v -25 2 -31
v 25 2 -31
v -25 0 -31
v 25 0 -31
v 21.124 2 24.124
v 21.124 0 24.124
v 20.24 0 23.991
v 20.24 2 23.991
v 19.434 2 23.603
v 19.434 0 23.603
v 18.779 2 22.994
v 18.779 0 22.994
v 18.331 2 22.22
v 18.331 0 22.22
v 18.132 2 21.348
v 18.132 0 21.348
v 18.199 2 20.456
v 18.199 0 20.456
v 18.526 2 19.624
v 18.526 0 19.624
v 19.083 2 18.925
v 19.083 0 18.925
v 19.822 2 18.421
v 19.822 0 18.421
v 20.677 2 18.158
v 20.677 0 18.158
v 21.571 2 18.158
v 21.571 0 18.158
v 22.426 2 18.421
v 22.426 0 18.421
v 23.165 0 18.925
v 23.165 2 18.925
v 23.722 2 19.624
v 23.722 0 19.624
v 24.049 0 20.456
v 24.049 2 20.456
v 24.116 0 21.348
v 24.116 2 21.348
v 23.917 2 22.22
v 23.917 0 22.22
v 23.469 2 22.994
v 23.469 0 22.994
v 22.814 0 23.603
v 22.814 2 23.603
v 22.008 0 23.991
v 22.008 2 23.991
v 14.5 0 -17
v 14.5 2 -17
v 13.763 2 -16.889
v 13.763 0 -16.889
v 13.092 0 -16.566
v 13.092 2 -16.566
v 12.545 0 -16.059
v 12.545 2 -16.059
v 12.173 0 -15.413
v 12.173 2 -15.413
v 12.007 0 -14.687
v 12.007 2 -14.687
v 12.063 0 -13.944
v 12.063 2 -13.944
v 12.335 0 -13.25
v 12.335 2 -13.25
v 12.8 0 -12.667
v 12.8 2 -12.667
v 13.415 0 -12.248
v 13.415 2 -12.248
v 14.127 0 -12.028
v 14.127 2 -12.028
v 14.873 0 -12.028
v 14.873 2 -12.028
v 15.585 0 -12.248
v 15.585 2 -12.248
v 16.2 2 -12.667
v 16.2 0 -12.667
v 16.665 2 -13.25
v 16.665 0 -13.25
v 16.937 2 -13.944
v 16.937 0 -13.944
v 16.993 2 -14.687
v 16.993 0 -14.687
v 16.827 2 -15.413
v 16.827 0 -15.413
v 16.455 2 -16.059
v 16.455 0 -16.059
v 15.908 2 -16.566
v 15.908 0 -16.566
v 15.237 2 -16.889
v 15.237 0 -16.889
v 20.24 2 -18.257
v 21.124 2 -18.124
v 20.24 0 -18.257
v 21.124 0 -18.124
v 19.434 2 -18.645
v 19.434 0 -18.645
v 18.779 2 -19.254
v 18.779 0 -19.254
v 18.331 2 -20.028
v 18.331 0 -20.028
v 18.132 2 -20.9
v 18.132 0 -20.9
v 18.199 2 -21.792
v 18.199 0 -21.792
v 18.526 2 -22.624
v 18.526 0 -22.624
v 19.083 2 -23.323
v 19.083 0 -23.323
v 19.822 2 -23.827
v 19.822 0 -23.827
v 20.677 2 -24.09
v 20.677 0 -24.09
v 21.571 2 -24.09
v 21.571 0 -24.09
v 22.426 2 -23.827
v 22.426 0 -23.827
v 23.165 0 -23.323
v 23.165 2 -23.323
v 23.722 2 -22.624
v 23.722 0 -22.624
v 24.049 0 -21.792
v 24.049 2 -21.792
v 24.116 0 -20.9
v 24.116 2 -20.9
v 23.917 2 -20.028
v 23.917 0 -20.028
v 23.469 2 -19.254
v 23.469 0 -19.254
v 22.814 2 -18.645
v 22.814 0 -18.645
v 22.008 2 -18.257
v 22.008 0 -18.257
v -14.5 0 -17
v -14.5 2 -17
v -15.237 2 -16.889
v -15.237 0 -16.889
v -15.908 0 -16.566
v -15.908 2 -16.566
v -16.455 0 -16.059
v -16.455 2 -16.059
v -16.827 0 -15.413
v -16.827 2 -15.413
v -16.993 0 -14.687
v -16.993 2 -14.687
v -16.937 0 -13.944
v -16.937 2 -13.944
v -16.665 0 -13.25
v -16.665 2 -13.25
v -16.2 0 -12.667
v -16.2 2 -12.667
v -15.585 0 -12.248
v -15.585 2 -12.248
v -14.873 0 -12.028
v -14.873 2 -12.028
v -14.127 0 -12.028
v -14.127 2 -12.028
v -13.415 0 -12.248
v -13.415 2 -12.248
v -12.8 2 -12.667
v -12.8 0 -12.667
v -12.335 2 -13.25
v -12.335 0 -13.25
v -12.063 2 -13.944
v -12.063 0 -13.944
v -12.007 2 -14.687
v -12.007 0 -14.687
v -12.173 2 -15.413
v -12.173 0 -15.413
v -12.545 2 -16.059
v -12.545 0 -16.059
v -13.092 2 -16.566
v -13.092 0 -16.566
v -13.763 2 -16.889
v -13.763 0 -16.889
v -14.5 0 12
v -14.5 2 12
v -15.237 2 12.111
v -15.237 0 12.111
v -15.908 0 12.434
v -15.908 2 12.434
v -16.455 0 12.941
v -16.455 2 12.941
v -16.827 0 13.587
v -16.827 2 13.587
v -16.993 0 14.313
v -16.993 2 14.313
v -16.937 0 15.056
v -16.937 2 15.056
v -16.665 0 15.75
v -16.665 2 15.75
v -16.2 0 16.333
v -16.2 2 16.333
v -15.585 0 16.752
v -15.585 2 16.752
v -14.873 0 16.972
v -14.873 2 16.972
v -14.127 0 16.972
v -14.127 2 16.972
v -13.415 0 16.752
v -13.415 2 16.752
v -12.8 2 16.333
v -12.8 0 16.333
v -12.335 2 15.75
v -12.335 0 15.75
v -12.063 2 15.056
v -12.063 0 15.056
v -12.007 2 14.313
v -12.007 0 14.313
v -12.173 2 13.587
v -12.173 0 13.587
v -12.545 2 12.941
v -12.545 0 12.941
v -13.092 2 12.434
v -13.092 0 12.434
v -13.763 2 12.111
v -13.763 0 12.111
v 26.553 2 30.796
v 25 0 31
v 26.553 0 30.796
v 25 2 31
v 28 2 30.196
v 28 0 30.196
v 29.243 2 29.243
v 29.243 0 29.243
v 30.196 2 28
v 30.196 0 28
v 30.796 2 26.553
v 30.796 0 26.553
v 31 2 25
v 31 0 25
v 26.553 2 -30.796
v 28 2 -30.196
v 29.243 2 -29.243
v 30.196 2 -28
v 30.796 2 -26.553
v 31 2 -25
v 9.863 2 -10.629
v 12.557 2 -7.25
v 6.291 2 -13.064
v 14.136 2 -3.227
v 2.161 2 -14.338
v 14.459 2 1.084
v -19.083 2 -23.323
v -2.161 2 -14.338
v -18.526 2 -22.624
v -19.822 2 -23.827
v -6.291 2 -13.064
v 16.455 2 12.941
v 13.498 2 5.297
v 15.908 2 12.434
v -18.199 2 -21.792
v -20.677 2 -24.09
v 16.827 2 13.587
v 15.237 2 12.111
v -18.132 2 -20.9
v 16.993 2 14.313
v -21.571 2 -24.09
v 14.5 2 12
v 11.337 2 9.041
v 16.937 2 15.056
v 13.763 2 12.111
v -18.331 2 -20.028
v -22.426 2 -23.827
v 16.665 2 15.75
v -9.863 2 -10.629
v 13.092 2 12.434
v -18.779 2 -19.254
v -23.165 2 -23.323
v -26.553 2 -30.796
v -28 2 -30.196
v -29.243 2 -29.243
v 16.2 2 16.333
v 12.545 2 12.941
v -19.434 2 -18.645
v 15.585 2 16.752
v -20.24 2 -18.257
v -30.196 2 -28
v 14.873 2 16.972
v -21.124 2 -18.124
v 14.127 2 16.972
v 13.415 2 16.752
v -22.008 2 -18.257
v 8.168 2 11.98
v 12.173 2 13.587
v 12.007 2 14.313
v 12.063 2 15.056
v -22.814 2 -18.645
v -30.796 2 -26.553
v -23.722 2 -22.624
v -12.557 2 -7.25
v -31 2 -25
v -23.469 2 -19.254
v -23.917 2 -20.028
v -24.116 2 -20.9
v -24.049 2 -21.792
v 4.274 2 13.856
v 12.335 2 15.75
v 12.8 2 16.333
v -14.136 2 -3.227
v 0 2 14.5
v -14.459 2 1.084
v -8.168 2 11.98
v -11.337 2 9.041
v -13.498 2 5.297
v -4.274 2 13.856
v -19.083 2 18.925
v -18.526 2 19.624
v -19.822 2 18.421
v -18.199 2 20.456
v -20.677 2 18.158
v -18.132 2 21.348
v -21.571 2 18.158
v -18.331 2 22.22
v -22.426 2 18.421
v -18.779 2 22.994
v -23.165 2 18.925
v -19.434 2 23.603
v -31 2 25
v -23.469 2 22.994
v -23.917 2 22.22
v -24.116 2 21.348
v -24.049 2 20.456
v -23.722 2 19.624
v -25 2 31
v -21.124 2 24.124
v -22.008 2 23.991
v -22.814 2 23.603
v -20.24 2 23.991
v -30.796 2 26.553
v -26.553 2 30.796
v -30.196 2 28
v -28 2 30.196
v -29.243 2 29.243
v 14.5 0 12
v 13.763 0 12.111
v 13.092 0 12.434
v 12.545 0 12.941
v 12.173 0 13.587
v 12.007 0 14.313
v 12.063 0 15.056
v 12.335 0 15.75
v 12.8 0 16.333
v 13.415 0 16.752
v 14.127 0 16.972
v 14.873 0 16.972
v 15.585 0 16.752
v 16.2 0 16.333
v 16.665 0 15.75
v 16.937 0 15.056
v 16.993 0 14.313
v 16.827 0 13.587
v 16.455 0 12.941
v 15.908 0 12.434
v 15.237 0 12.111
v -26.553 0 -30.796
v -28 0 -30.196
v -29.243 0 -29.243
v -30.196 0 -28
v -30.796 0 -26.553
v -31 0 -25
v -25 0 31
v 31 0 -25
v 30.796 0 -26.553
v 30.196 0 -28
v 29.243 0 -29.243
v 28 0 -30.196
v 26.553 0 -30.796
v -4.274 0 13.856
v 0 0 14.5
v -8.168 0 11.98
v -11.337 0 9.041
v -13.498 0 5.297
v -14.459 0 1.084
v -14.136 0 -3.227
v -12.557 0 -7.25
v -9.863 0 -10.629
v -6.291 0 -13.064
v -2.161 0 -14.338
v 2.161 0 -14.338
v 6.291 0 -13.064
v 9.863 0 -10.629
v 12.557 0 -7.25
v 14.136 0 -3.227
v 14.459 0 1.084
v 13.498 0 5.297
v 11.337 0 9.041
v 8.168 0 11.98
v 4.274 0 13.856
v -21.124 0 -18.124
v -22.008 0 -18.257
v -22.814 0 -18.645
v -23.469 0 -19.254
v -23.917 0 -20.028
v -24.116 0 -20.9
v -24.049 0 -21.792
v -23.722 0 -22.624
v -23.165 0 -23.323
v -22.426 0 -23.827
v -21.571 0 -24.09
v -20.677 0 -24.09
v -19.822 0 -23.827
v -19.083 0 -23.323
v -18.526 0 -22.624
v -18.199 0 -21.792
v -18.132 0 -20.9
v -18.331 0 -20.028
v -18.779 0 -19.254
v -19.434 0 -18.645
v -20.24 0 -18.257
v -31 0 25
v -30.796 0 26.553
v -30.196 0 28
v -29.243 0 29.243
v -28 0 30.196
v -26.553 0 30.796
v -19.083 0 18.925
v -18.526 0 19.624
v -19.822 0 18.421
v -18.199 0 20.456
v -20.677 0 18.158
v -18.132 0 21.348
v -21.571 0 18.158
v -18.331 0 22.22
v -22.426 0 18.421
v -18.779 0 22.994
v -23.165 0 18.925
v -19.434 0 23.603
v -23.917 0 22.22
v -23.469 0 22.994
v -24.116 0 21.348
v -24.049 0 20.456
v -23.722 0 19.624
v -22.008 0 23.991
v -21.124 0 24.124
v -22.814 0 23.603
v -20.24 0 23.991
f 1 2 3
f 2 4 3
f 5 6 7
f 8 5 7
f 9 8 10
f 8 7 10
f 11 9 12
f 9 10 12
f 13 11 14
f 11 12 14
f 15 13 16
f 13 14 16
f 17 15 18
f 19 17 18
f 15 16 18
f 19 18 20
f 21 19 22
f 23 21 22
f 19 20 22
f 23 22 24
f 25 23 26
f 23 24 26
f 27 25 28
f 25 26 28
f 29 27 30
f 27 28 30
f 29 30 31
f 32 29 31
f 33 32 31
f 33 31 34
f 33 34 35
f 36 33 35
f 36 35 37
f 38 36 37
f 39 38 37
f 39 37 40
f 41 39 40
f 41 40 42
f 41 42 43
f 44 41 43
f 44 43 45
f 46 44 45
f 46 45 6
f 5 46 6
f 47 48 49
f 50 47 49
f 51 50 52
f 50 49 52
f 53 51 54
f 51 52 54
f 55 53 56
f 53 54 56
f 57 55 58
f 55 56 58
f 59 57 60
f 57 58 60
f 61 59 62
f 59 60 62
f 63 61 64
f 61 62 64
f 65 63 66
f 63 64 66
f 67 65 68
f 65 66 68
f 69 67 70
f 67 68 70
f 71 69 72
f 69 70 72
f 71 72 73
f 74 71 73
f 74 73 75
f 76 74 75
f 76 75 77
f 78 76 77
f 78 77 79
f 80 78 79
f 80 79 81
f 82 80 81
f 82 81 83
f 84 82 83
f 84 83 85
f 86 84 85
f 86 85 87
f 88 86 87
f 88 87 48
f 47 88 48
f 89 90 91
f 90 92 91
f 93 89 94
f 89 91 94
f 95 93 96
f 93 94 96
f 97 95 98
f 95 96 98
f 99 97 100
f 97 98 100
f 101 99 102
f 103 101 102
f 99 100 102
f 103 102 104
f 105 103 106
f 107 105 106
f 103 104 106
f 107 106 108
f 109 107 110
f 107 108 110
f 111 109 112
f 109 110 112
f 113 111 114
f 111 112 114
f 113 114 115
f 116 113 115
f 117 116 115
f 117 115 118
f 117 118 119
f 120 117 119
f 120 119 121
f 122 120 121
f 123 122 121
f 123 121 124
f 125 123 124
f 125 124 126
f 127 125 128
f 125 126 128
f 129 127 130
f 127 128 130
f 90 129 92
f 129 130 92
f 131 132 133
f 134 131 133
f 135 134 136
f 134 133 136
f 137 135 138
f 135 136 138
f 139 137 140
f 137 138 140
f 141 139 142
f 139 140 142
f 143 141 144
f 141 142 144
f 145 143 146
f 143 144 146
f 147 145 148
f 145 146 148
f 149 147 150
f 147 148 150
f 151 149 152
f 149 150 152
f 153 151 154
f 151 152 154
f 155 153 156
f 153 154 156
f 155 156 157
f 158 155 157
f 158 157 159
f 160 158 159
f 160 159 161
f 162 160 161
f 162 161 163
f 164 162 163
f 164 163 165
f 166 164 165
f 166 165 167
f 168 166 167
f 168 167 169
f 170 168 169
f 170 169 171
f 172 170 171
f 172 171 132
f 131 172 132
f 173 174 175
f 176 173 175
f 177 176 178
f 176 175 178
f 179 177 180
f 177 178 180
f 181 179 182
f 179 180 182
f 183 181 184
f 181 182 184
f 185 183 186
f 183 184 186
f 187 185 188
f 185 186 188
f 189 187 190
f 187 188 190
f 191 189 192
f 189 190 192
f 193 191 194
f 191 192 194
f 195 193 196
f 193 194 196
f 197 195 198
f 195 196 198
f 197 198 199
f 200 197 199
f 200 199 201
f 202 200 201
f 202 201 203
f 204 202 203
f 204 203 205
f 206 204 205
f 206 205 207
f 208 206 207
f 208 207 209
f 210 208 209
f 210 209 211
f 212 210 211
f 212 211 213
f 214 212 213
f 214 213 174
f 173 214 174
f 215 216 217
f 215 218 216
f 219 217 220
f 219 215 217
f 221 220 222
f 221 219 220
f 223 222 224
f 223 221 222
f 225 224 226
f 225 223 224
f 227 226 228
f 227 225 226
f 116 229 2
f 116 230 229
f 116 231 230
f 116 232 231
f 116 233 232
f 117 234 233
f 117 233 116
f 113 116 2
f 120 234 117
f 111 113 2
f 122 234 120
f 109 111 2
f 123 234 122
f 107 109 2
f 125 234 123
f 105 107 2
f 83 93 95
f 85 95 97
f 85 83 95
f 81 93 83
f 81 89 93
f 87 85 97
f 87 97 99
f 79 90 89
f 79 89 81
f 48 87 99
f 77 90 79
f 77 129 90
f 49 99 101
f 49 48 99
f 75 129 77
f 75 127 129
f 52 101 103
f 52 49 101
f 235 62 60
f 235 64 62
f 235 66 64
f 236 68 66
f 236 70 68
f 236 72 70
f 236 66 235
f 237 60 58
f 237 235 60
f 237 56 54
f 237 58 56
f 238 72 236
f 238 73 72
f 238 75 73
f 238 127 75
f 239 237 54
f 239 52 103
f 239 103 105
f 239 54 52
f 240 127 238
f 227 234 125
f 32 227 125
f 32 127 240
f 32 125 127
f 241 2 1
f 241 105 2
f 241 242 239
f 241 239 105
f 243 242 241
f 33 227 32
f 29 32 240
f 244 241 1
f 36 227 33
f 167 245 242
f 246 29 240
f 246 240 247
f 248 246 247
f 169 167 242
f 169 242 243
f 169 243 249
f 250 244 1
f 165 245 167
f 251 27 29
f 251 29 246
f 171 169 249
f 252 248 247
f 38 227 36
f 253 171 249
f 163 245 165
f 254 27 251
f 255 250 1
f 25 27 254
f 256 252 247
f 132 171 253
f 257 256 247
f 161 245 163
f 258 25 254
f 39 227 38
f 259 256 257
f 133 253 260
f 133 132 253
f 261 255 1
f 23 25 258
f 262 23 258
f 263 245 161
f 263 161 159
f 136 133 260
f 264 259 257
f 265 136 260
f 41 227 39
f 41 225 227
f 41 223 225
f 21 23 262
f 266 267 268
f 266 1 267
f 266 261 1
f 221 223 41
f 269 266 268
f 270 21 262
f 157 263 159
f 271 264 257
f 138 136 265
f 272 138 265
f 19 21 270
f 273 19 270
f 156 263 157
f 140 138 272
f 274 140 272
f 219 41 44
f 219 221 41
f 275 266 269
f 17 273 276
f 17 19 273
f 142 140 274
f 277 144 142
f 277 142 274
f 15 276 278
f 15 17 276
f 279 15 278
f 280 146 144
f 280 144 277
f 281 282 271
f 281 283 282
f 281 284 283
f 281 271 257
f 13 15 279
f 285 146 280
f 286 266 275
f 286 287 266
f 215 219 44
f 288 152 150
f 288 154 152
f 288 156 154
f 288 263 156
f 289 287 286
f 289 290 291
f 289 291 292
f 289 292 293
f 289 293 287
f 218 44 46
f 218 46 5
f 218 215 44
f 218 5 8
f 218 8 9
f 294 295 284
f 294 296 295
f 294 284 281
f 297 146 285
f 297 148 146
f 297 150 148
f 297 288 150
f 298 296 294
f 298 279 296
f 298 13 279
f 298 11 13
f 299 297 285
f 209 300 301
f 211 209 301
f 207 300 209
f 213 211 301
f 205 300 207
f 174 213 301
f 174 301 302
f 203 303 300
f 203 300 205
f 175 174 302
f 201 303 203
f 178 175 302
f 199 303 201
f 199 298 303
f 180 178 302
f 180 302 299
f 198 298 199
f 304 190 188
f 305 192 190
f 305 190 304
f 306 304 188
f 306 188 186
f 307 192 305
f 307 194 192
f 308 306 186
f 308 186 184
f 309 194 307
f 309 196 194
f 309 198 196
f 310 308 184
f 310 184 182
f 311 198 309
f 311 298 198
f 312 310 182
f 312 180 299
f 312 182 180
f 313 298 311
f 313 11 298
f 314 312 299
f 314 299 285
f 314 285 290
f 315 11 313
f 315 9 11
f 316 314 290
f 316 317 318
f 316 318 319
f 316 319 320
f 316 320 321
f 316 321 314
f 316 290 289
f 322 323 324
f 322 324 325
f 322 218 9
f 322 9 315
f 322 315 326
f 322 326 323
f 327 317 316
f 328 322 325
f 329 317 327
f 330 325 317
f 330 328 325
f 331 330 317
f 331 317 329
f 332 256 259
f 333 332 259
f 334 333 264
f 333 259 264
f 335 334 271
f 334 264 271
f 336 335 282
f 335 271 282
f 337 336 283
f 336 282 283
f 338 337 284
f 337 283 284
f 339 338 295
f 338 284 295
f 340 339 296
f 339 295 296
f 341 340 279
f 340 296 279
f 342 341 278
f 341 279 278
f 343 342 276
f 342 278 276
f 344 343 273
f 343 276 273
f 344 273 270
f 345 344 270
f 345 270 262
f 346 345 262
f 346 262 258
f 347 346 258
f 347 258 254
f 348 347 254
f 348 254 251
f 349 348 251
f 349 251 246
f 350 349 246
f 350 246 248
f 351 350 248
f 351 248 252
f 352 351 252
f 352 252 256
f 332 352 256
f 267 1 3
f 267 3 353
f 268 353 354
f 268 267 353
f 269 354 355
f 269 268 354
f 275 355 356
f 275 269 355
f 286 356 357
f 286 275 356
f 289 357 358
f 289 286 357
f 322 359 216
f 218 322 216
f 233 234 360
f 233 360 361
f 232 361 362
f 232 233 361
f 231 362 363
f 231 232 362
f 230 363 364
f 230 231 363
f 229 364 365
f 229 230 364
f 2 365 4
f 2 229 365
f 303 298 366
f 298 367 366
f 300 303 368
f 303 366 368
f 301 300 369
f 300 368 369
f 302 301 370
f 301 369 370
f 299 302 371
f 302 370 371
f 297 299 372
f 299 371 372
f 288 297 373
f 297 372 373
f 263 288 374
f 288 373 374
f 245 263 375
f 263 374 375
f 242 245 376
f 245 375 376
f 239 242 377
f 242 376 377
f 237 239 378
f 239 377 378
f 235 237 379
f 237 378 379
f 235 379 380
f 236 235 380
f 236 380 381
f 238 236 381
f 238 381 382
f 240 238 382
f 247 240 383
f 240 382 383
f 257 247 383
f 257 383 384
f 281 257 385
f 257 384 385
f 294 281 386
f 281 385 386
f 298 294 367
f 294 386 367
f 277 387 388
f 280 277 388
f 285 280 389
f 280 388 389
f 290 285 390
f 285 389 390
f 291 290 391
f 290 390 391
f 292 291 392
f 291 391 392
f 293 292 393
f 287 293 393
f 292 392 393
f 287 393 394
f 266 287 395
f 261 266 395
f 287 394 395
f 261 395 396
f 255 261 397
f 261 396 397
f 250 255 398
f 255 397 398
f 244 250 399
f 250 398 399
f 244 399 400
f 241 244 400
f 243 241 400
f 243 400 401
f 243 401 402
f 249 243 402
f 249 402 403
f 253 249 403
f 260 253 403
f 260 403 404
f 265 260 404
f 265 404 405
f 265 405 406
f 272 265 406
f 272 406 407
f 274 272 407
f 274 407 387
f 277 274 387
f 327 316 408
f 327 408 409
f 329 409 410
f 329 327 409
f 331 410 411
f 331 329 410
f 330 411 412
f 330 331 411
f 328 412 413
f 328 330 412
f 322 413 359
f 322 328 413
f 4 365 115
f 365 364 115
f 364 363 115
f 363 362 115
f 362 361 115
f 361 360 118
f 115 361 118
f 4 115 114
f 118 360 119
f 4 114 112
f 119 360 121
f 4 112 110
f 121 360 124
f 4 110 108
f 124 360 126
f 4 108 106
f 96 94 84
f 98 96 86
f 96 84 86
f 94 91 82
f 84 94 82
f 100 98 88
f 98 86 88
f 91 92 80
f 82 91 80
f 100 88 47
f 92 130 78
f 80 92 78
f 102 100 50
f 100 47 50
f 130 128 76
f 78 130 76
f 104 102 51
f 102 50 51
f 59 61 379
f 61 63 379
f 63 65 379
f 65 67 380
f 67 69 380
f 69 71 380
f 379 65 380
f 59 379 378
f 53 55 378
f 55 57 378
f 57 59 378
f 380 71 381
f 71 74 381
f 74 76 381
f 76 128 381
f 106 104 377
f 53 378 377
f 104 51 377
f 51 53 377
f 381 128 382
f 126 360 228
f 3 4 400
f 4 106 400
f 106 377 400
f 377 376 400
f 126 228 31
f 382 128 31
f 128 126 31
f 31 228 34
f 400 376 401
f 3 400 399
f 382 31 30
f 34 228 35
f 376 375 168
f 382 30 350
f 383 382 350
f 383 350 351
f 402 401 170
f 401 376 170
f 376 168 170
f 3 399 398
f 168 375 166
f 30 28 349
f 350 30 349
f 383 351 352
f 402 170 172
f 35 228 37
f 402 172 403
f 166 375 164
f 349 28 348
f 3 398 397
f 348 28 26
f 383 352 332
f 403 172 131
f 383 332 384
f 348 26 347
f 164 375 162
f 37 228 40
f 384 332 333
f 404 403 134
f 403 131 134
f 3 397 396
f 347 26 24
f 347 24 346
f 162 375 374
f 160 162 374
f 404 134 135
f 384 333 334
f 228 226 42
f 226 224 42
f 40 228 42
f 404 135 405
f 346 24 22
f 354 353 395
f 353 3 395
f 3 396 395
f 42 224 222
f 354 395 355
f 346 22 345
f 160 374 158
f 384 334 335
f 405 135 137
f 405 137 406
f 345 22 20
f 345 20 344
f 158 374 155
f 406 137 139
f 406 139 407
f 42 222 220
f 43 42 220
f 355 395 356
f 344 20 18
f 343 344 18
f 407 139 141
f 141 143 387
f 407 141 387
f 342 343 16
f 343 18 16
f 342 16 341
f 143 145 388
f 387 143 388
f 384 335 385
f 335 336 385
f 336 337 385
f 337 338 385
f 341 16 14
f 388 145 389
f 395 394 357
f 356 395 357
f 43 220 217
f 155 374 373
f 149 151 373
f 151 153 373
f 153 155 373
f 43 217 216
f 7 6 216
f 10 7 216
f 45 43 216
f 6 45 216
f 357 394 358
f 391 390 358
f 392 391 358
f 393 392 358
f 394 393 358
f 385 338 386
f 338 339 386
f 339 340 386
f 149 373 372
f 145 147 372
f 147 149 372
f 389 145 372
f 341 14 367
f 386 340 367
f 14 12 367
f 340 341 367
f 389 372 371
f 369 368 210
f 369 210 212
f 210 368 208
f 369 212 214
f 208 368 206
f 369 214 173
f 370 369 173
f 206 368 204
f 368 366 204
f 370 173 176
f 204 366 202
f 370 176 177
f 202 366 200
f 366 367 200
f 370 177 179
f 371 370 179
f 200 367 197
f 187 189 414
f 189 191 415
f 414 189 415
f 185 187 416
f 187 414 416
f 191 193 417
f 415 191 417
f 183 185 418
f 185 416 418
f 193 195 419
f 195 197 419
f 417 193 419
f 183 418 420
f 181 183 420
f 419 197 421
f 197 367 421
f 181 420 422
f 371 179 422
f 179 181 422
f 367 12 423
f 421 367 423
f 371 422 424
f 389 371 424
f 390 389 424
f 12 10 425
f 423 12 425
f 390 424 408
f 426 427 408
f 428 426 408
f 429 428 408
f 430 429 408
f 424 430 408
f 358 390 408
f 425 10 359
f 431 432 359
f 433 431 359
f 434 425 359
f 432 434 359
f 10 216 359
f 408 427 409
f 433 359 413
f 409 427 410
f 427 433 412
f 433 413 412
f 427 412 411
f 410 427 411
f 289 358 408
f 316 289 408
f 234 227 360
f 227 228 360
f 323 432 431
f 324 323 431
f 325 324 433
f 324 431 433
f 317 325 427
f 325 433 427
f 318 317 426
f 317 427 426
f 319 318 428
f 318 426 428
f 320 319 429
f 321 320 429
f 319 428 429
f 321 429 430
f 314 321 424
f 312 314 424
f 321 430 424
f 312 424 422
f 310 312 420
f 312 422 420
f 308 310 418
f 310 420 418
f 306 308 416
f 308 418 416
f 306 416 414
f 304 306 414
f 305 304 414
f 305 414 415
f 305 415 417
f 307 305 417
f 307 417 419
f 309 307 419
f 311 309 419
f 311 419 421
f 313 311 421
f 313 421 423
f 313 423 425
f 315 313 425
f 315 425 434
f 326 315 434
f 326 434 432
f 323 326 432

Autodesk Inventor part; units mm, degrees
ref_plane "YZ Plane" through (0, 0, 0) normal (1, 0, 0) x (0, 1, 0)
ref_plane "XZ Plane" through (0, 0, 0) normal (0, 1, 0) x (-1, 0, 0)
ref_plane "XY Plane" through (0, 0, 0) normal (0, 0, 1) x (1, 0, 0)
sketch "Skizze1" plane through (0, 0, 0) normal (0, 1, 0) x (-1, 0, 0)
  line L0 (31, 31) -> (-31, 31)
  line L1 (-31, 31) -> (-31, -31)
  line L2 (-31, -31) -> (31, -31)
  line L3 (31, -31) -> (31, 31)
  line L4 (31, 31) -> (-31, -31) construction
  line L5 (-31, 31) -> (31, -31) construction
  point P0 (0, 0)
  dimension "d0" = 62
  dimension "d1" = 62
extrude "Extrusion1" add sketch "Skizze1" along normal blind 2
fillet "Rundung1" radius 6 4 edges at (-31, 1, 31) (31, 1, 31) (31, 1, -31) (-31, 1, -31)
sketch "Skizze2" plane through (0, 2, 0) normal (0, 1, 0) x (1, 0, 0)
  line L0 (-25, -31) -> (25, -31) projected
  line L1 (0, -31) -> (0, 31) construction
  line L2 (25, 31) -> (-25, 31) projected
  line L3 (31, -25) -> (31, 25) projected
  line L4 (31, 0) -> (-31, 0) construction
  line L5 (-31, 25) -> (-31, -25) projected
  point P0 (0, 0)
  point P1 (21.124, 21.124)
  point P2 (21.124, -21.124)
  point P3 (-21.124, 21.124)
  point P4 (-21.124, -21.124)
  dimension "d37" = 42.248
  dimension "d38" = 42.248
  dimension "d39" = 42.248
hole "Bohrung1" at (21.124, 2, -21.124) at (21.124, 2, 21.124) at (-21.124, 2, -21.124) at (-21.124, 2, 21.124) direction (0, -1, 0) diameter 6 depth 2
hole "Bohrung2" at (0, 2, 0) direction (0, -1, 0) diameter 29 depth 2
sketch "Skizze3" plane through (0, 0, 0) normal (0, -1, 0) x (1, 0, 0)
  point P0 (0, 0)
  point P1 (-14.5, 14.5)
  point P2 (14.5, 14.5)
  point P3 (-14.5, -14.5)
  point P4 (14.5, -14.5)
  dimension "d33" = 29
  dimension "d34" = 14.5
  dimension "d35" = 29
  dimension "d36" = 14.5
hole "Bohrung3" at (-14.5, 0, 14.5) at (14.5, 0, 14.5) at (-14.5, 0, -14.5) at (14.5, 0, -14.5) direction (0, 1, 0) diameter 5 depth 2
equation "\"d37\" = d38"
equation "\"d39\" = d38"
properties part number "12"
